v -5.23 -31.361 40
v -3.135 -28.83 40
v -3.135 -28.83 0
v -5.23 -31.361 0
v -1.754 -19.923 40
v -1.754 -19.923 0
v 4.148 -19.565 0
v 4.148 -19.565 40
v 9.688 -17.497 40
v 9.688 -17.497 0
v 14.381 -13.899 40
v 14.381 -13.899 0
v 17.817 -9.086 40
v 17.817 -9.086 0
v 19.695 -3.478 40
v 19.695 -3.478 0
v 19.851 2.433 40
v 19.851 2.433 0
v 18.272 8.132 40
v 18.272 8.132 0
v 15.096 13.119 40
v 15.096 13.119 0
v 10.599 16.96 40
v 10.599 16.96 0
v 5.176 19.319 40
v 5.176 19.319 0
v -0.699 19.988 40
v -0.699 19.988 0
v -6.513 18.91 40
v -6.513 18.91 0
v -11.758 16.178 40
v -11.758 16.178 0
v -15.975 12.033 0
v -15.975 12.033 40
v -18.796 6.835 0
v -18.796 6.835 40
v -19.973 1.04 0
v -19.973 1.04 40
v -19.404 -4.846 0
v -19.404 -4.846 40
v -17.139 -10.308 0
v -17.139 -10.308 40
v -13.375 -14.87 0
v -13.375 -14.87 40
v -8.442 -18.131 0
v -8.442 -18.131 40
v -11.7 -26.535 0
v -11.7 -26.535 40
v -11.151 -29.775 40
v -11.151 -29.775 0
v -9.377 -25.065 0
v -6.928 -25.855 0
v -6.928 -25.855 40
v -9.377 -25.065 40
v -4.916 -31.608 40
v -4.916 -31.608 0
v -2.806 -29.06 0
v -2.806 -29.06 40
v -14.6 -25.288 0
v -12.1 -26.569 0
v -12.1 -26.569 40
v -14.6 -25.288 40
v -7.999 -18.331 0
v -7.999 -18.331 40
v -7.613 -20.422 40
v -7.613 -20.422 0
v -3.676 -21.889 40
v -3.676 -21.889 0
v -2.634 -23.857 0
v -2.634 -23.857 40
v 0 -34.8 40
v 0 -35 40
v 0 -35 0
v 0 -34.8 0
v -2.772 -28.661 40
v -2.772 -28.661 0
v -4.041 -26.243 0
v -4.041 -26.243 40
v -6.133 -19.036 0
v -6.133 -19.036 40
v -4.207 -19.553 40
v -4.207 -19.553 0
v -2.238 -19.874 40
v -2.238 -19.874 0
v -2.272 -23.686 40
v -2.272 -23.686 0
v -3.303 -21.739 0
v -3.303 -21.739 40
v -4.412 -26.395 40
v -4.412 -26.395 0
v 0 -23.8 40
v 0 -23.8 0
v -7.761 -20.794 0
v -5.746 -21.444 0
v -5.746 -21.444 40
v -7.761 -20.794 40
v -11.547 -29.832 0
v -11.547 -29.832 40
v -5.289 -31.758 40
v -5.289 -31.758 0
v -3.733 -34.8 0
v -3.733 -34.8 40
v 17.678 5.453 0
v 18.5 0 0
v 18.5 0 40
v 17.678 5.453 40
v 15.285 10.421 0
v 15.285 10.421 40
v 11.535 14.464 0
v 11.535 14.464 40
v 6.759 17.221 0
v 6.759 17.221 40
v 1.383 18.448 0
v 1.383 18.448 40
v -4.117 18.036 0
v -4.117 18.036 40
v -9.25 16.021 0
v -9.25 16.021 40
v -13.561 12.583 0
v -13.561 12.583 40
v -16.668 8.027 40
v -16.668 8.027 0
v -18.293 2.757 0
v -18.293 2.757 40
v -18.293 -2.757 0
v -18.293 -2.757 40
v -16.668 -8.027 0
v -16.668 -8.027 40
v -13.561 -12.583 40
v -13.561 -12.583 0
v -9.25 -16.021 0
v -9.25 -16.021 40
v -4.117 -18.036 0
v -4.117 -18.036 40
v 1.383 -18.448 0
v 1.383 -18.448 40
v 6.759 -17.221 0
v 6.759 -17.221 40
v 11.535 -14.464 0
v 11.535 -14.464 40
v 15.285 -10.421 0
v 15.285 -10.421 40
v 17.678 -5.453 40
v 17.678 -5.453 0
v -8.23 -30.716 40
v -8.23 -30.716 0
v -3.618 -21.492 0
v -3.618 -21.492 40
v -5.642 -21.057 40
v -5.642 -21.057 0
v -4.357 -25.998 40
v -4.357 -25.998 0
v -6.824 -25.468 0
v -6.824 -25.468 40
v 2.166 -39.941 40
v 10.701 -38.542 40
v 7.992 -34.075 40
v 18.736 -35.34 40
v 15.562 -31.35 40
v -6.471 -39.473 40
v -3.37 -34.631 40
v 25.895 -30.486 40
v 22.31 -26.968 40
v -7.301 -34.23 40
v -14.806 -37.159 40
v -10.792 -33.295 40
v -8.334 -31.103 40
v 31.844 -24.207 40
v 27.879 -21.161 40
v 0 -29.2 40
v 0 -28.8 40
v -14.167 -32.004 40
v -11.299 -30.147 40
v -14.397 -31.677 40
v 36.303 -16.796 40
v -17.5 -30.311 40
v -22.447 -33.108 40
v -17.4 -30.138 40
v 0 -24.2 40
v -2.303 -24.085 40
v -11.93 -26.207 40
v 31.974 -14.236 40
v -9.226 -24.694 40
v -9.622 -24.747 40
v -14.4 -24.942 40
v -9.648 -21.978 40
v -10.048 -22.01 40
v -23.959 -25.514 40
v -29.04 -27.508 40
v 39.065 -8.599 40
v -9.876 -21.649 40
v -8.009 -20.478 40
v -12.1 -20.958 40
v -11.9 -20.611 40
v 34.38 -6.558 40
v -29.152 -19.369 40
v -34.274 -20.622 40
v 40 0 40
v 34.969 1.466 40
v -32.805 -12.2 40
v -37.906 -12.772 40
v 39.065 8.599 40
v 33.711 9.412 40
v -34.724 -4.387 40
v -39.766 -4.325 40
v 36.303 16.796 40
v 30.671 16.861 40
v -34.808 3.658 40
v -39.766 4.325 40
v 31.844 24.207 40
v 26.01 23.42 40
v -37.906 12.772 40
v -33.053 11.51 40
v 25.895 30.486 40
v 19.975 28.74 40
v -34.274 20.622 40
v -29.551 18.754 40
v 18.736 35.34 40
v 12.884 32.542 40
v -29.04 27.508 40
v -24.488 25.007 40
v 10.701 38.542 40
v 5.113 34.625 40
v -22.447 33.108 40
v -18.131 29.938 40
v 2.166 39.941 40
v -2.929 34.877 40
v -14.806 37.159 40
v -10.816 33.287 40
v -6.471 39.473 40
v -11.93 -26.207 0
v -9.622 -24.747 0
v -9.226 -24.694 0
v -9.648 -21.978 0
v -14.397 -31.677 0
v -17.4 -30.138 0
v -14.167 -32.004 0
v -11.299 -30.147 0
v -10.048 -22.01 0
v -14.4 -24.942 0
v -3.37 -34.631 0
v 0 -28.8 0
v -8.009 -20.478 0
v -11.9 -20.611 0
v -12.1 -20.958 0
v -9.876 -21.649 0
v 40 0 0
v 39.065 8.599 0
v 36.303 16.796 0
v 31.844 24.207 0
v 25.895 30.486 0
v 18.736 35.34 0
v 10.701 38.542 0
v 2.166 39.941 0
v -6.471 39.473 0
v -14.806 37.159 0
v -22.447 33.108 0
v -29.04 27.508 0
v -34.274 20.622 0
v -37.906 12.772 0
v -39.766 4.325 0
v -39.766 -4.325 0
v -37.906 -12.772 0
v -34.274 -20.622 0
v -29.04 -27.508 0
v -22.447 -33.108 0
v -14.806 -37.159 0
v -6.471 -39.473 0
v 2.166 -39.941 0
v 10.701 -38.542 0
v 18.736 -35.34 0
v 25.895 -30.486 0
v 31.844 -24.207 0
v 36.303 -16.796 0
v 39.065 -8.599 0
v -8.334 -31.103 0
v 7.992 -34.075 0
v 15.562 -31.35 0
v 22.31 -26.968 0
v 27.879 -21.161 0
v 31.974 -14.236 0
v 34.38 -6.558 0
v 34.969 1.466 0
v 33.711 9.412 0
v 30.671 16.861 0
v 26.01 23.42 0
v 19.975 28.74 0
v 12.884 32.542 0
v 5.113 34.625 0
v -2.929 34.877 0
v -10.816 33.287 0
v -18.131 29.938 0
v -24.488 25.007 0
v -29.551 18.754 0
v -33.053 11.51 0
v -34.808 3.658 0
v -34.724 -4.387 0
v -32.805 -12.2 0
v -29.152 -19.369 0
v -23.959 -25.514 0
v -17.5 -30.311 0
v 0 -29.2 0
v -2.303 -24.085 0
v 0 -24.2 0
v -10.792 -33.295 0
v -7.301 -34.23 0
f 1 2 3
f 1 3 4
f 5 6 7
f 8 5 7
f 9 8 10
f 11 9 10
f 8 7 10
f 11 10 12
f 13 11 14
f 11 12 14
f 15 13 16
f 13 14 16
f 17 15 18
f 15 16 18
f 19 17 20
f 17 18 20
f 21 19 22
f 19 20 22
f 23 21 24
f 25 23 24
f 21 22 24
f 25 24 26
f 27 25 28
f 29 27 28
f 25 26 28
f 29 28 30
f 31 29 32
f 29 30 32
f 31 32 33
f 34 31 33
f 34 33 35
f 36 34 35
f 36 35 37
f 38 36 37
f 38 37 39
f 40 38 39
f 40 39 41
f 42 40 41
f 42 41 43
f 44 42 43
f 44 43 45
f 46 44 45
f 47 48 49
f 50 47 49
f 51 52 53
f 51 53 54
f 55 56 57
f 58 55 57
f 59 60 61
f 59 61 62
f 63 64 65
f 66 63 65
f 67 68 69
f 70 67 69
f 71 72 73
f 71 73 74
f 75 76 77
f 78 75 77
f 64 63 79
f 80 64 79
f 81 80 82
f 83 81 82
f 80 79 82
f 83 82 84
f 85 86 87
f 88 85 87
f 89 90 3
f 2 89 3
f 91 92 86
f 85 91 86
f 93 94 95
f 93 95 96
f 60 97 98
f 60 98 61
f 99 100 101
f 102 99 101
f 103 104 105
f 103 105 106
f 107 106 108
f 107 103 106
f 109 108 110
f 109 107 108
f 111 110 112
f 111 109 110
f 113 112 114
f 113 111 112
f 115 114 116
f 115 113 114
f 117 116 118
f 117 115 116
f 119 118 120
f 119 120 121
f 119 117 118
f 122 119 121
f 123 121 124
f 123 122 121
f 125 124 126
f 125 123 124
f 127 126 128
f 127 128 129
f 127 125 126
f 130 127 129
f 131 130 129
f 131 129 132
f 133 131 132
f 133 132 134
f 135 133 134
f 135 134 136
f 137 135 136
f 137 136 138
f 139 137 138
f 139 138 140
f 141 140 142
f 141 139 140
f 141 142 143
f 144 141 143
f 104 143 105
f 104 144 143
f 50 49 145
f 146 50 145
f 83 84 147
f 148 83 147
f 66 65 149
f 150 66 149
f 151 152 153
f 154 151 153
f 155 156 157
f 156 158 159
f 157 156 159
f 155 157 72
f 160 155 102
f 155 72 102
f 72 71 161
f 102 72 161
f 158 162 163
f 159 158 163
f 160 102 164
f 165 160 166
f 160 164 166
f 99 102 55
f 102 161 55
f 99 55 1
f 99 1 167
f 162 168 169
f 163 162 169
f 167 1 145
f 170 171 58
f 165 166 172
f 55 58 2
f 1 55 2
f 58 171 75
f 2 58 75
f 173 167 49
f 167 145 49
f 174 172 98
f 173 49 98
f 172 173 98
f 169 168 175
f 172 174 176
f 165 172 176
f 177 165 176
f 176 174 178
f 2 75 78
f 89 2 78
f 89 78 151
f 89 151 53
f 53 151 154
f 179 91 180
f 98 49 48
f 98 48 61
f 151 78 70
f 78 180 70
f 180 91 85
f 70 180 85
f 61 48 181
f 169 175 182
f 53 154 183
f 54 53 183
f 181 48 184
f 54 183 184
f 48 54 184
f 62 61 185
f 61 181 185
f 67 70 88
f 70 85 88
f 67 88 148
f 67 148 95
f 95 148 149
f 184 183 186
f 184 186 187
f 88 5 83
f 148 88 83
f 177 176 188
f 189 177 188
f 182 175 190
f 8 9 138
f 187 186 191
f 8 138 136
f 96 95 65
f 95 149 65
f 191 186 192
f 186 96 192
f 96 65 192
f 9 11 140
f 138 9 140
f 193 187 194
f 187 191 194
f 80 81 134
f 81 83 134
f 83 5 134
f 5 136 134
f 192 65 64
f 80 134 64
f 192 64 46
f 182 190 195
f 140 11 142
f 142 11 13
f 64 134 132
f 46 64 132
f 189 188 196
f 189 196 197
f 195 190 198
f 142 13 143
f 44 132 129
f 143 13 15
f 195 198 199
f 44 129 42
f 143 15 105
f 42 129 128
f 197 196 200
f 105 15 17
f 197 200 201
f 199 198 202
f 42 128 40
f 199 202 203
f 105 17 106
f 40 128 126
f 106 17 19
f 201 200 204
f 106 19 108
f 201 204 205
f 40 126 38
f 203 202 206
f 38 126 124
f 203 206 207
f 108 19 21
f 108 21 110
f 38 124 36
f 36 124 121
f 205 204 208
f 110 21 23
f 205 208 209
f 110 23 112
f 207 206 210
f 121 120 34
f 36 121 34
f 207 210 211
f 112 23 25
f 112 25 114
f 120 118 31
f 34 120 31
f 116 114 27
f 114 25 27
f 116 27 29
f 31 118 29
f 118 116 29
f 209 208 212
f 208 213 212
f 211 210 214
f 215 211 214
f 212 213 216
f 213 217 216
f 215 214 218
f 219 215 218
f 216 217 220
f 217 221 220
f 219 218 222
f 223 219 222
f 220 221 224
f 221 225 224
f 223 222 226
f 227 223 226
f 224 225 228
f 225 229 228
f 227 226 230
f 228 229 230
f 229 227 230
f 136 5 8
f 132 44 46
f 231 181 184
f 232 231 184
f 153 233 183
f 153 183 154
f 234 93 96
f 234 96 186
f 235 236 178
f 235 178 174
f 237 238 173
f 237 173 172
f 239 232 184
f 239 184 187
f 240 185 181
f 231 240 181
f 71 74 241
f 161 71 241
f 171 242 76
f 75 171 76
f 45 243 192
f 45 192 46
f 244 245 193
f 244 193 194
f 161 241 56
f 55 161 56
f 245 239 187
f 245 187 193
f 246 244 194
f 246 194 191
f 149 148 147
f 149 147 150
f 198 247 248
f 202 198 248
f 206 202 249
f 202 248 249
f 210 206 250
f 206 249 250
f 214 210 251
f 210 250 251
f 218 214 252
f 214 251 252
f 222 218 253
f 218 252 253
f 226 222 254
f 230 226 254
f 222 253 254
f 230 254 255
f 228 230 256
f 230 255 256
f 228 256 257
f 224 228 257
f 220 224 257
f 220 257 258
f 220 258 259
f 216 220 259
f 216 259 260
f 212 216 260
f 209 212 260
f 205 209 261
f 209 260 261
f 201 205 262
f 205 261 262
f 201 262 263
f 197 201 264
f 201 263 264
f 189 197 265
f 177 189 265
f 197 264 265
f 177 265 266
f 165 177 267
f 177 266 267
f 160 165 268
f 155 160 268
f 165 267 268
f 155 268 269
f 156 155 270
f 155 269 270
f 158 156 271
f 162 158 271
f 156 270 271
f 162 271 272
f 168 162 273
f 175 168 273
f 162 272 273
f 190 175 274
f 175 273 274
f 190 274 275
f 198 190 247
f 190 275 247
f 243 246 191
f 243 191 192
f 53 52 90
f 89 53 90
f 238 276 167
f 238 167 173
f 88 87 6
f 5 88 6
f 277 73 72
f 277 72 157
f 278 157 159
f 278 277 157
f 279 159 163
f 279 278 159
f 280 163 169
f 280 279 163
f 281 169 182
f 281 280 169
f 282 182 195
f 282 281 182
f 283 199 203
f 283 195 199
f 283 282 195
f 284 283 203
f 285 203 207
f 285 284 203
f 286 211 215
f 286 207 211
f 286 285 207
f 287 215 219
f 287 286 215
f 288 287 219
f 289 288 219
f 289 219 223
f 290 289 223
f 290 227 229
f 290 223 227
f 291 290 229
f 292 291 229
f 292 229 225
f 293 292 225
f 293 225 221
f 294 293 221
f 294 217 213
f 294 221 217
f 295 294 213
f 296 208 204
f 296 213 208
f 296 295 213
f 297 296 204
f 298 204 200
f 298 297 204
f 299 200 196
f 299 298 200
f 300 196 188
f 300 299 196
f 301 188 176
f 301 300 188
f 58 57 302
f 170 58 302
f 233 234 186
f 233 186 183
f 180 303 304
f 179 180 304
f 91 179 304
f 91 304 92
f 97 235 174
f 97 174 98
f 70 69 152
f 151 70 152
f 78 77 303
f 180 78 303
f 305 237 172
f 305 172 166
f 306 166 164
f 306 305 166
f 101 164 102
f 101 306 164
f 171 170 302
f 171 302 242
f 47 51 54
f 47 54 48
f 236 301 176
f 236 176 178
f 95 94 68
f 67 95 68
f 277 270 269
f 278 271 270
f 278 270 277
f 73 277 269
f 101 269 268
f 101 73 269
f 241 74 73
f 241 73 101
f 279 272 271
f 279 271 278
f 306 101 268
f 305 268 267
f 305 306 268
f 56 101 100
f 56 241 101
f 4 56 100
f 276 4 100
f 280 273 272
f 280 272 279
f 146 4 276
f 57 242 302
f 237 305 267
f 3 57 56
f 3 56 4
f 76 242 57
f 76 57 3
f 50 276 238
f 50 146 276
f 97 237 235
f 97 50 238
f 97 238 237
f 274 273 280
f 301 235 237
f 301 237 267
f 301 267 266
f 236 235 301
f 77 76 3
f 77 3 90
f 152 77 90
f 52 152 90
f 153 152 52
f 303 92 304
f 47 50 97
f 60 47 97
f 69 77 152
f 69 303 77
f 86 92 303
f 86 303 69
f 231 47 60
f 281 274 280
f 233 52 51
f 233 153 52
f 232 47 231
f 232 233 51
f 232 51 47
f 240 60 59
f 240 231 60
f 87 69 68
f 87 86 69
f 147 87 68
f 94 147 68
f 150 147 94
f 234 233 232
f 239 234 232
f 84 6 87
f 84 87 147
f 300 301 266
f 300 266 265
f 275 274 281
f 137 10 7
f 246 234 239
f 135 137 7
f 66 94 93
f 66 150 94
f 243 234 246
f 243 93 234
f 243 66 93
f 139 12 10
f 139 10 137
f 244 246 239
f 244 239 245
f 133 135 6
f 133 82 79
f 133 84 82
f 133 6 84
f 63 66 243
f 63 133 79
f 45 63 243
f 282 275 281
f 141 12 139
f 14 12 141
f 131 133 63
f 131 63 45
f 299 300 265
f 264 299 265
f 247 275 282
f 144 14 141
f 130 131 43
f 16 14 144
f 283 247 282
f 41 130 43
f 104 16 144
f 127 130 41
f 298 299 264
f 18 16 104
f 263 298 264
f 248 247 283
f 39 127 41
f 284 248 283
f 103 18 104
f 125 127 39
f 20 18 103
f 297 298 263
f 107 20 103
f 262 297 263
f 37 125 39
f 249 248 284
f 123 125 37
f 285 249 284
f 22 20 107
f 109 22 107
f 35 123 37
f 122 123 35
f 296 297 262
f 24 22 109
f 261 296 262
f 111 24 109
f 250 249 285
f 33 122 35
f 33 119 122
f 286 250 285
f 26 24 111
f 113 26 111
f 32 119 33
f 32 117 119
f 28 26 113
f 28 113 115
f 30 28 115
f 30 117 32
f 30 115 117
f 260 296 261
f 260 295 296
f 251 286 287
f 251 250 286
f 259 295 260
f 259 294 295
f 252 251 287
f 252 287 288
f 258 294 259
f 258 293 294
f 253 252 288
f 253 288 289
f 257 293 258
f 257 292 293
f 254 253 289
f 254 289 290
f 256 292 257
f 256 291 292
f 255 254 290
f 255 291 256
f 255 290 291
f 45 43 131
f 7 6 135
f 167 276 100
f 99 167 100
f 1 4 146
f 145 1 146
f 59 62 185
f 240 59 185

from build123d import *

# Parameters (mm, degrees)
BOSS_EXTRUDE1_DEPTH = 40
SKETCH1_6_R         = 40
SKETCH1_6_R_2       = 35
SKETCH1_6_R_3       = 20
SKETCH1_6_R_4       = 18.5
BOSS_EXTRUDE2_DEPTH = 40


with BuildPart() as part:
    # Sketch1 → Boss-Extrude1 (new body)
    with BuildSketch(Plane.XY):
        with BuildLine():
            Line((0, -29.2), (0, -29))
            Line((0, -29), (-2.896372732, -28.855))
            Line((-2.896372732, -28.855), (-5.153701873, -31.582263329))
            Line((-5.153701873, -31.582263329), (-3.495622262, -34.825))
            ThreePointArc((-3.495622262, -34.825), (-1.75, -34.956222622), (0, -35))
            Line((0, -35), (0, -34.8))
            Line((0, -34.8), (-3.370043386, -34.631286807))
            Line((-3.370043386, -34.631286807), (-4.915711127, -31.608396089))
            Line((-4.915711127, -31.608396089), (-2.806033523, -29.059522617))
            Line((-2.806033523, -29.059522617), (0, -29.2))
        make_face()
        with BuildLine():
            Line((-3.495622262, -34.825), (-5.153701873, -31.582263329))
            Line((-5.153701873, -31.582263329), (-8.282209443, -30.909626441))
            Line((-8.282209443, -30.909626441), (-8.334038079, -31.103053542))
            Line((-8.334038079, -31.103053542), (-5.288554278, -31.757840113))
            Line((-5.288554278, -31.757840113), (-3.732843691, -34.800371808))
            ThreePointArc((-3.732843691, -34.800371808), (-3.614253954, -34.812887963), (-3.495622262, -34.825))
        make_face()
        Polygon((-5.153701873, -31.582263329), (-2.896372732, -28.855), (-4.278593468, -26.219534795), (-6.875874487, -25.661112933), (-6.927703123, -25.854540034), (-4.412206949, -26.395377951), (-3.135314054, -28.830015709), (-5.230359841, -31.36121129), (-8.230380808, -30.716199341), (-8.282209443, -30.909626441), align=None)
        Polygon((-2.896372732, -28.855), (0, -29), (0, -28.8), (-2.772167607, -28.661218034), (-4.040561936, -26.2427844), (-2.303365501, -24.084687494), (0, -24.2), (0, -24), (-2.395409567, -23.880079527), (-4.278593468, -26.219534795), align=None)
        Polygon((-6.875874487, -25.661112933), (-4.278593468, -26.219534795), (-2.395409567, -23.880079527), (-3.543170038, -21.712806039), (-5.694018992, -21.250368178), (-5.745847628, -21.443795279), (-3.676306485, -21.888751758), (-2.633800725, -23.857276683), (-4.357083522, -25.998088853), (-6.824045852, -25.467685833), align=None)
        with BuildLine():
            Line((-3.543170038, -21.712806039), (-2.395409567, -23.880079527))
            Line((-2.395409567, -23.880079527), (0, -24))
            Line((0, -24), (0, -23.8))
            Line((0, -23.8), (-2.271732982, -23.686271101))
            Line((-2.271732982, -23.686271101), (-3.30286447, -21.73922379))
            Line((-3.30286447, -21.73922379), (-1.754210625, -19.922920094))
            ThreePointArc((-1.754210625, -19.922920094), (-1.875889536, -19.91183162), (-1.997498436, -19.9))
            Line((-1.997498436, -19.9), (-3.543170038, -21.712806039))
        make_face()
        with BuildLine():
            Line((-5.694018992, -21.250368178), (-3.543170038, -21.712806039))
            Line((-3.543170038, -21.712806039), (-1.997498436, -19.9))
            ThreePointArc((-1.997498436, -19.9), (-2.118012645, -19.887534348), (-2.238449128, -19.874338869))
            Line((-2.238449128, -19.874338869), (-3.617879715, -21.492172887))
            Line((-3.617879715, -21.492172887), (-5.642190357, -21.056941078))
            Line((-5.642190357, -21.056941078), (-5.694018992, -21.250368178))
        make_face()
    boss_extrude1 = extrude(amount=BOSS_EXTRUDE1_DEPTH)

    # Sketch1<6> → Boss-Extrude2 (add)
    with BuildSketch(Plane.XY):
        Circle(SKETCH1_6_R)
        Circle(SKETCH1_6_R_2, mode=Mode.SUBTRACT)
        Circle(SKETCH1_6_R_3)
        Circle(SKETCH1_6_R_4, mode=Mode.SUBTRACT)
    extrude(amount=BOSS_EXTRUDE2_DEPTH)

    # Mirror1: Boss-Extrude1 across plane
    add(boss_extrude1.mirror(Plane(origin=(0, 0, 40), x_dir=(0, 0, 1), z_dir=(0.9659258262890685, -0.2588190451025203, 0))))


solid = part.part
